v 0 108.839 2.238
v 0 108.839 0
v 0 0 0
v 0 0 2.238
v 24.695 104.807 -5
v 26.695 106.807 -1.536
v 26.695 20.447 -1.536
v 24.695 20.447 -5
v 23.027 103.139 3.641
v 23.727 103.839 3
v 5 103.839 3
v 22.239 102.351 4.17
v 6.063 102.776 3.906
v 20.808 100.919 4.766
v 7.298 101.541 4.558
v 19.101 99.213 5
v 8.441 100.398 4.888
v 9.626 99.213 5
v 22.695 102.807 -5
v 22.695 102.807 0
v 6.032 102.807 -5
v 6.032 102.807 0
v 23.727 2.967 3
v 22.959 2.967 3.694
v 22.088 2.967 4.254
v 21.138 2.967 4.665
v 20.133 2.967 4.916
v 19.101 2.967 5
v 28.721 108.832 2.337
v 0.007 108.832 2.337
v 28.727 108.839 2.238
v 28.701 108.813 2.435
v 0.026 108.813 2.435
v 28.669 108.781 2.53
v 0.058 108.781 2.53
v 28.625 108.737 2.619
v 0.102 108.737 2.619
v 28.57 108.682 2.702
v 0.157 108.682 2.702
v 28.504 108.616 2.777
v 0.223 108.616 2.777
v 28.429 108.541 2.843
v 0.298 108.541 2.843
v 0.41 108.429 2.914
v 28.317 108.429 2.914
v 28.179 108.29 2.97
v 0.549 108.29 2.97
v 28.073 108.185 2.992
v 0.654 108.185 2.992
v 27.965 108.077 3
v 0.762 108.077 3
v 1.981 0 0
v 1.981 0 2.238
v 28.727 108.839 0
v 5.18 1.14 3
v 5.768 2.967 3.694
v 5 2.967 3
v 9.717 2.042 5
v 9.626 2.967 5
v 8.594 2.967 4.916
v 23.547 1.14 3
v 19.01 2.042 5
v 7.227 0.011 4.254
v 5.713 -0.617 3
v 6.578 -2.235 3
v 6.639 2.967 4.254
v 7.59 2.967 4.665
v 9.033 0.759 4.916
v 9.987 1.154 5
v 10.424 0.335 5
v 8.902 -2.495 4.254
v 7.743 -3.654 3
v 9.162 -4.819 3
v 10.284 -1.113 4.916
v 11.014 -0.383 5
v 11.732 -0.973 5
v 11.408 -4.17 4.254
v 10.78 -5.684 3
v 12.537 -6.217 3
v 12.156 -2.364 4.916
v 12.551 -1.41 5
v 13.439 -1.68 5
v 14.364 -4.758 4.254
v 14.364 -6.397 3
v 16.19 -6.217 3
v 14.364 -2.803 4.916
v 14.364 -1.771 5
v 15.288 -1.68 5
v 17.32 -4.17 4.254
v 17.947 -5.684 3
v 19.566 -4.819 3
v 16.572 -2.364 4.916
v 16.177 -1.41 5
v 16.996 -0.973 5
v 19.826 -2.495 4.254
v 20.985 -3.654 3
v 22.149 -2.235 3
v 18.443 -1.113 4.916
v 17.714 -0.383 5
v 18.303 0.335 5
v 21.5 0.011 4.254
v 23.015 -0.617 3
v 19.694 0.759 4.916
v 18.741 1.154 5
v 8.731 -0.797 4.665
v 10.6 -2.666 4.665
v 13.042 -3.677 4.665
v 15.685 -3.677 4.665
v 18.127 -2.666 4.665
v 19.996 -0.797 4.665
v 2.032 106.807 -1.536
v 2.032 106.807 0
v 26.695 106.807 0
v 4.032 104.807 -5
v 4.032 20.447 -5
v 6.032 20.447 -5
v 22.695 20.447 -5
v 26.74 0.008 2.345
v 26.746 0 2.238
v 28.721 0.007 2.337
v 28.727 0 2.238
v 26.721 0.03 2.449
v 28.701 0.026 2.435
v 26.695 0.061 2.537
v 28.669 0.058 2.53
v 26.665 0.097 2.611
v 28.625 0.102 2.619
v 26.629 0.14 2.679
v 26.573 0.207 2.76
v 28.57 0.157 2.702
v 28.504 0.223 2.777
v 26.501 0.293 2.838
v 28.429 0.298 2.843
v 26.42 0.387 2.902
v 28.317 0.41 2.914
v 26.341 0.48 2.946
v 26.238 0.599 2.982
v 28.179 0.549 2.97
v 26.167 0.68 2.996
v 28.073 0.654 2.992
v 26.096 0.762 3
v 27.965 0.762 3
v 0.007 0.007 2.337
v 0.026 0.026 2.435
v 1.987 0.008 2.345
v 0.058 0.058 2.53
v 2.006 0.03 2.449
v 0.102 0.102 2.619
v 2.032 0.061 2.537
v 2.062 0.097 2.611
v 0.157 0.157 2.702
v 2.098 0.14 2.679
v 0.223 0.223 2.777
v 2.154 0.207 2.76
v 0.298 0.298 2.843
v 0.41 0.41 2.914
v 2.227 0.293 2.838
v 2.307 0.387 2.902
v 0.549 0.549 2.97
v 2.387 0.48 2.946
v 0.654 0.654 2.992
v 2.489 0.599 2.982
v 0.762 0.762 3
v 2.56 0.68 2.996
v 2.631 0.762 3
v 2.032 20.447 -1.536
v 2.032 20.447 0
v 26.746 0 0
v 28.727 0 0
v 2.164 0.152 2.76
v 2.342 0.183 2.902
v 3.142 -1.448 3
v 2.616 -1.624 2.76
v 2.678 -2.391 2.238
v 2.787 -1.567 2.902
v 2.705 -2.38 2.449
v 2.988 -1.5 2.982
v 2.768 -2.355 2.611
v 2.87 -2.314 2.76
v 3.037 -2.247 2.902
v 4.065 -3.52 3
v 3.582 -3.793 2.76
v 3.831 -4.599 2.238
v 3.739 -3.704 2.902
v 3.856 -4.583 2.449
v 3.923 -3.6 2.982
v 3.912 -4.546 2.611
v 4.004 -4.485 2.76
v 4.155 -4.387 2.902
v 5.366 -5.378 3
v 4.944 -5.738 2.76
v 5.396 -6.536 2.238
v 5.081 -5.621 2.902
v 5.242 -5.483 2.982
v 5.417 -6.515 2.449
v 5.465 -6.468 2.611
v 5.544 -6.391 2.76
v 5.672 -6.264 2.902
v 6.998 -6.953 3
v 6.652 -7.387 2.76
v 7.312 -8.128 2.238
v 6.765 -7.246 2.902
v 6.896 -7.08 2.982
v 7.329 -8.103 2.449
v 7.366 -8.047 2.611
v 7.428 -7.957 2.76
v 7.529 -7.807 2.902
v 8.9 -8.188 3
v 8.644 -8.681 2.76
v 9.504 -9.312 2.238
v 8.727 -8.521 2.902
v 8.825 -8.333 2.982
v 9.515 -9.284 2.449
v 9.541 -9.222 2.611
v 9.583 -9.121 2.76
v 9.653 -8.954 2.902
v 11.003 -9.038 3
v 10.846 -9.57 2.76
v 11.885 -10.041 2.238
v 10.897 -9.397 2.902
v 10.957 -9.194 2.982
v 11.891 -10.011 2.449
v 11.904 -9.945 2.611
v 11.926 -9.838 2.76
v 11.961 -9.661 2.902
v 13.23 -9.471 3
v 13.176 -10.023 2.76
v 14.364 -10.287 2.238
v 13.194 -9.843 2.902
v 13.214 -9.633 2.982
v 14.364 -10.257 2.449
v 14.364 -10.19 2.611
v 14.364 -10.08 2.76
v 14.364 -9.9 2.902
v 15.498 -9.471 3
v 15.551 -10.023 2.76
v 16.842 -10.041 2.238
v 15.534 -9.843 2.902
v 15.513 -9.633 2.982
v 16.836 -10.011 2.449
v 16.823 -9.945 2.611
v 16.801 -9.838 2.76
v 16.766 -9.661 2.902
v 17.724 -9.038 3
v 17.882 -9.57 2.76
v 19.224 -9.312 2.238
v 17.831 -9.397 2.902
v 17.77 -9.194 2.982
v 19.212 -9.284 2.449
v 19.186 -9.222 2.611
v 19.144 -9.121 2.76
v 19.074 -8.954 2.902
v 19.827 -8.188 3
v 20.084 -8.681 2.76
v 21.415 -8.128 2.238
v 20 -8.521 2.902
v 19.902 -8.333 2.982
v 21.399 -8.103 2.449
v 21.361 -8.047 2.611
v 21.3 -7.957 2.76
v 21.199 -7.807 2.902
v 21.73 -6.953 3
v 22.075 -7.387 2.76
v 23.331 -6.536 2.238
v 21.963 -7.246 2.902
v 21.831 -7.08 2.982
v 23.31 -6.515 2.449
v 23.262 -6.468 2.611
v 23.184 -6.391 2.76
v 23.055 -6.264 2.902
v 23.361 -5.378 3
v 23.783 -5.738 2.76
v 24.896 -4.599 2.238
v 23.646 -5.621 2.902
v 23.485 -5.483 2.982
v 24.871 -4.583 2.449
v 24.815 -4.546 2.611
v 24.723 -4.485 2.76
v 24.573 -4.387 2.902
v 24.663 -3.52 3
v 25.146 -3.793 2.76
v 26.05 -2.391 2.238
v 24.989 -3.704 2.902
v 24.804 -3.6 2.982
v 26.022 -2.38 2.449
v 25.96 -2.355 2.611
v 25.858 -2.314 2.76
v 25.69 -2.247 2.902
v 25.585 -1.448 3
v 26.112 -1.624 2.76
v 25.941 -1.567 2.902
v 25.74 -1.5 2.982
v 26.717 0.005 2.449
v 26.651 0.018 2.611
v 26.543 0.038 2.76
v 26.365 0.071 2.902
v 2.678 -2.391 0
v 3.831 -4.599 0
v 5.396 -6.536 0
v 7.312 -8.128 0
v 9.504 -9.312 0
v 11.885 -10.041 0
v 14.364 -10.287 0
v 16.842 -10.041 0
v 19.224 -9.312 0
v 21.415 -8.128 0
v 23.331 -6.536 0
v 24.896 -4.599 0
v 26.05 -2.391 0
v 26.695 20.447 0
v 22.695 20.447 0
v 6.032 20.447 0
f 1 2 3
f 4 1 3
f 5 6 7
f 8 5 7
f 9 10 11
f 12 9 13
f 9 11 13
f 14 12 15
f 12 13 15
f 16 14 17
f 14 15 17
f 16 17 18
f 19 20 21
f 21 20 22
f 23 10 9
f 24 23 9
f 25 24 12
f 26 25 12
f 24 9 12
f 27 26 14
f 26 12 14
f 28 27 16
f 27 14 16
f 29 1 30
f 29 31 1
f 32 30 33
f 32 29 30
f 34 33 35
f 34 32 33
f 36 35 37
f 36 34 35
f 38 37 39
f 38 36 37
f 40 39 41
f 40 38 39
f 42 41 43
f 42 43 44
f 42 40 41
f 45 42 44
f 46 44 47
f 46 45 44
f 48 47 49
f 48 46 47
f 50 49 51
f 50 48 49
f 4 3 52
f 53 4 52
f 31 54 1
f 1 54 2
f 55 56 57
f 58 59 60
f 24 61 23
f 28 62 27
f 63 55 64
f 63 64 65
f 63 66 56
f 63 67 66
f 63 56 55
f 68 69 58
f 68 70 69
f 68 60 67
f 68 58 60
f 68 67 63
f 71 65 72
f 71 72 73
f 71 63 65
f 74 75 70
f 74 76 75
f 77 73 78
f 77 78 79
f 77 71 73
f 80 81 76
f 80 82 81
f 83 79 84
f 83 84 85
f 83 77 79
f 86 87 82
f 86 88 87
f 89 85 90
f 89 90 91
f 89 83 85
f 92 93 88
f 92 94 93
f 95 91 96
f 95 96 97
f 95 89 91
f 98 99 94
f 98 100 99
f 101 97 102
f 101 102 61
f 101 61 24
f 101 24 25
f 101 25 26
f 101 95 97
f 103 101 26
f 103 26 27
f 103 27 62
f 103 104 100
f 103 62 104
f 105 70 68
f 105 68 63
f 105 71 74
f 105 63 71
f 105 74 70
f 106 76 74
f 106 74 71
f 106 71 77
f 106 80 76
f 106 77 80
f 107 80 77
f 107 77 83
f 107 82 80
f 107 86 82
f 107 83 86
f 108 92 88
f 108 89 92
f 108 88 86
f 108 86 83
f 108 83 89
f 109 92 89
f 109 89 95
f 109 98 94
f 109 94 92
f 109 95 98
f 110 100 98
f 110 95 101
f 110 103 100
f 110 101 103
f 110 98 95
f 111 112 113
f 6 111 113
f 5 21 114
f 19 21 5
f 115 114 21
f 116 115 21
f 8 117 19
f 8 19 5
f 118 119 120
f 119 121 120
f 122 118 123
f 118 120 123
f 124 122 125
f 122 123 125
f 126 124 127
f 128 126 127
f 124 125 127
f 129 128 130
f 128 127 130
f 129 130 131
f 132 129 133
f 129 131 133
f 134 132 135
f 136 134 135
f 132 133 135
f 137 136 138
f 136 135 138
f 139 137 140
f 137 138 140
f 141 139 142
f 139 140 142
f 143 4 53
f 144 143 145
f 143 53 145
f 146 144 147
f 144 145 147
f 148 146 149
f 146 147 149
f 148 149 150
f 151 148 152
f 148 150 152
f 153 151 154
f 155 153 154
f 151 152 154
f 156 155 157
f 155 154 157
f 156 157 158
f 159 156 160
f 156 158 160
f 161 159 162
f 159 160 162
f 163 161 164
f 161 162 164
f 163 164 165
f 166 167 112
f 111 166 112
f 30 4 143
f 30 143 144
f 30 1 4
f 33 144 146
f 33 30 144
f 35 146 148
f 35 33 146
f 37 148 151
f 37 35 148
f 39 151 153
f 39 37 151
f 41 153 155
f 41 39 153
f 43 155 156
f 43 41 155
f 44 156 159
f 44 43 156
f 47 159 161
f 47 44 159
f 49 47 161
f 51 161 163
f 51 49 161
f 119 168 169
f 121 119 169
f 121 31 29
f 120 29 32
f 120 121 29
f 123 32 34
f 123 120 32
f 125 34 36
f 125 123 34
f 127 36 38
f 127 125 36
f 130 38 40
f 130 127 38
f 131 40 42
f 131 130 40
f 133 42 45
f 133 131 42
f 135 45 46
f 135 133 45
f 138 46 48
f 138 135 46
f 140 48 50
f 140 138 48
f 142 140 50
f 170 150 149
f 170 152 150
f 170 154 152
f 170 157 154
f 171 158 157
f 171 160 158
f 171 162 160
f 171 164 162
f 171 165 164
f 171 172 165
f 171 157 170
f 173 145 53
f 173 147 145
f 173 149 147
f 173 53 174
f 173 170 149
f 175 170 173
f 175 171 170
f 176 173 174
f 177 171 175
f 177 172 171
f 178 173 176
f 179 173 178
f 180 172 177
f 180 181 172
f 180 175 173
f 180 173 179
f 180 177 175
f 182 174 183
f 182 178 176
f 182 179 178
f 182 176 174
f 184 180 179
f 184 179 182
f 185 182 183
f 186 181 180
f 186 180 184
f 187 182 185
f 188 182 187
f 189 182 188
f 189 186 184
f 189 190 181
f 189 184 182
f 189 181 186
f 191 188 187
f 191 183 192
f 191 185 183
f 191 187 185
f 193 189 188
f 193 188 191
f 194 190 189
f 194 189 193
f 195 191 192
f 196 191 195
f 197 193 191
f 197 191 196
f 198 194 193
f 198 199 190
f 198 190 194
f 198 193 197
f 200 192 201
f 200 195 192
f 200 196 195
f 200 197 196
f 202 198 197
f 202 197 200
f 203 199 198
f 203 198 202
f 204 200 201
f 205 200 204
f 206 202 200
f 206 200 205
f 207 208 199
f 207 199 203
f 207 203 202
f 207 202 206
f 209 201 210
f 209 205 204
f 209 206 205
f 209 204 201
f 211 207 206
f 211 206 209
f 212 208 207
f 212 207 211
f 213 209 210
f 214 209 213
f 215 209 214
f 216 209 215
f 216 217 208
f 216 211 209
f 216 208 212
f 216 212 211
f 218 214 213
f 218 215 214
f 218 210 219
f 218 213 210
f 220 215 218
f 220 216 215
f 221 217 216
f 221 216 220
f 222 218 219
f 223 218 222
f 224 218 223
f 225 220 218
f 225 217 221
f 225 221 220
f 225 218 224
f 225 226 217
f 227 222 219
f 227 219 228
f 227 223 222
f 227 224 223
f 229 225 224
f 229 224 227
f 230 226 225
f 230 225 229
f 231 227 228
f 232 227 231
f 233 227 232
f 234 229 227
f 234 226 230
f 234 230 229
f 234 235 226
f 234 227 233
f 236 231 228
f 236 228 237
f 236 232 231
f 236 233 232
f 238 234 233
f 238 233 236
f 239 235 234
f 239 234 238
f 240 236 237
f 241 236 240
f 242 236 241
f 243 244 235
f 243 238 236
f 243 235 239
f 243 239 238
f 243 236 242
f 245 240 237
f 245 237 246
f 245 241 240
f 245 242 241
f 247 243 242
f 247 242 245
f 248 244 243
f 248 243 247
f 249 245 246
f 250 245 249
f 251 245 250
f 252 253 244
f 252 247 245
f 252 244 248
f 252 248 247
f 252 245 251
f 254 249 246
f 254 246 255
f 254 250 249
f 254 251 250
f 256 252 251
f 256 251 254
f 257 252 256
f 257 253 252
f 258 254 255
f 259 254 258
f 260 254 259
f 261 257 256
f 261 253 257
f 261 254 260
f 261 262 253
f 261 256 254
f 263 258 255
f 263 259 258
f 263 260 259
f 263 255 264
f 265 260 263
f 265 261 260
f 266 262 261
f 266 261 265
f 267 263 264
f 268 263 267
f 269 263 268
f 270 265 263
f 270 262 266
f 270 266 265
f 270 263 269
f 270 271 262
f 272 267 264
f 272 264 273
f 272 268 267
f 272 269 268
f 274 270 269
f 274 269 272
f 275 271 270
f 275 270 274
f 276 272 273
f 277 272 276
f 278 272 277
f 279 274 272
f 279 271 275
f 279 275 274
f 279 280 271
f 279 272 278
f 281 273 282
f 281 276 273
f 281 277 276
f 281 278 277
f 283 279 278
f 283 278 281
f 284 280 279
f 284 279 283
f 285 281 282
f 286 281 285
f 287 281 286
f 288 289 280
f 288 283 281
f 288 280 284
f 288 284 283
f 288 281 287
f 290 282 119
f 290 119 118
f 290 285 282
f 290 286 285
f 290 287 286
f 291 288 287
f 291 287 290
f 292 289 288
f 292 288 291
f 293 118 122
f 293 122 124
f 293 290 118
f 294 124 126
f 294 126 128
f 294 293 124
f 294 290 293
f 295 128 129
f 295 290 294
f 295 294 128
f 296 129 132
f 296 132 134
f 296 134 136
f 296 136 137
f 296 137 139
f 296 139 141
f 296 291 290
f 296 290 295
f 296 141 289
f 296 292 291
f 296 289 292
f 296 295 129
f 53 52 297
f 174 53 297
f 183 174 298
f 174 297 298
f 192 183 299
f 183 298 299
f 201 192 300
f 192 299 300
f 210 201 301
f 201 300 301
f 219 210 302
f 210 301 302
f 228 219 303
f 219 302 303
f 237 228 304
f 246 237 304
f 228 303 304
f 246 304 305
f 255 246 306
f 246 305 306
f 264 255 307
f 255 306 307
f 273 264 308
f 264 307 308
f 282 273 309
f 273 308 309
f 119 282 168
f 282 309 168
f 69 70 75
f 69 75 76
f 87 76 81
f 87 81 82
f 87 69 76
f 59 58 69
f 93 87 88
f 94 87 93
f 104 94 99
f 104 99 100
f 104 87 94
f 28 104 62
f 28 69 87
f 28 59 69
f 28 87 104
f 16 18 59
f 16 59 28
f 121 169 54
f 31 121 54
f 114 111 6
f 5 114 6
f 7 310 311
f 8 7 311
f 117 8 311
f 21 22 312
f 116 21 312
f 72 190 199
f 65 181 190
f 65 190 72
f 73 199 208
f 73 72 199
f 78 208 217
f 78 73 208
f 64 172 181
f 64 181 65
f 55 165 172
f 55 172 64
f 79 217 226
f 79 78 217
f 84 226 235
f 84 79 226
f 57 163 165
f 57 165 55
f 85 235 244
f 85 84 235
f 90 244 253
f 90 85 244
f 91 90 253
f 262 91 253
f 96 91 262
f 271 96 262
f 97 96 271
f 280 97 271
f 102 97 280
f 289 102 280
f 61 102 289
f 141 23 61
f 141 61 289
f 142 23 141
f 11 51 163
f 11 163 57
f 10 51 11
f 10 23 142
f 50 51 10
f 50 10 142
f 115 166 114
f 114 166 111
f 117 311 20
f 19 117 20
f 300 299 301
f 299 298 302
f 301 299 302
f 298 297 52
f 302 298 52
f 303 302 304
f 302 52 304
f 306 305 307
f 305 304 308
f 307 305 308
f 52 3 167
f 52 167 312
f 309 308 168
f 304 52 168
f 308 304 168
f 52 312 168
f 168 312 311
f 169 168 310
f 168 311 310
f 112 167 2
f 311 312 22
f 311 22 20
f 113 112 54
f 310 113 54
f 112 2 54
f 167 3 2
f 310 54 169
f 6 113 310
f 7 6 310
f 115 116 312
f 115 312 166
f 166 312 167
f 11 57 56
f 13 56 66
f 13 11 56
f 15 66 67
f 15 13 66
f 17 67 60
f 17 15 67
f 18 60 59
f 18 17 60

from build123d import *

# Parameters (mm, degrees)
F1_DEPTH    = 3
F3_DEPTH    = 5
F4_SIZE2    = 3.4641016151
F4_SIZE     = 2
F6_DEPTH    = 2
F6_TAPER    = 25
F7_T1_DEPTH = 109.1731798991
F7_T3_DEPTH = 35.3291597983
F7_T6_ANGLE = 180
F8_R        = 0.762


# Not quite as in the source:
# - a fillet or chamfer that OpenCascade refuses, or shapes differently, is made with other operations: its cross-section is extruded or revolved along the edge and cut away or added


with BuildPart() as f1:
    # F0 (on Top) → F1 (new body)
    with BuildSketch(Plane.XY):
        with BuildLine():
            Line((28.7274, 108.839), (0, 108.839))
            Line((0, 108.839), (0, 0))
            Line((0, 0), (1.9812, 0))
            ThreePointArc((1.9812, 0), (14.3637, -10.287), (26.7462, 0))
            Line((26.7462, 0), (28.7274, 0))
            Line((28.7274, 0), (28.7274, 108.839))
        make_face()
    extrude(amount=F1_DEPTH)

    # F2 (on face) → F3 (join)
    with BuildSketch(Plane(origin=(0, 0, 0), x_dir=(1, 0, 0), z_dir=(0, 0, -1))):
        Polygon((6.032, -20.447), (2.032, -20.447), (2.032, -106.807), (26.6954, -106.807), (26.6954, -20.447), (22.6954, -20.447), (22.6954, -102.807), (6.032, -102.807), align=None)
    extrude(amount=F3_DEPTH)

    # F4
    f4_edges = [f1.edges().sort_by_distance(p)[0] for p in [
        (2.032, 63.627, -5),
        (14.3637, 106.807, -5),
        (26.6954, 63.627, -5),
    ]]
    f4_side = f1.faces().sort_by_distance((4.032, 21.345128, -5))[0]
    chamfer(f4_edges, length=F4_SIZE, length2=F4_SIZE2, reference=f4_side)

    # F5 (on face) → F6 (join)
    with BuildSketch(Plane.XY.offset(3)):
        with BuildLine():
            Line((23.7274, 103.839), (5, 103.839))
            Line((5, 103.839), (5, 2.9667))
            ThreePointArc((5, 2.9667), (14.3637, -6.397), (23.7274, 2.9667))
            Line((23.7274, 2.9667), (23.7274, 103.839))
        make_face()
    extrude(amount=F6_DEPTH, taper=F6_TAPER)

    # F7: fillet of radius 6.35 on 4 edges, made by hand

    # F7_s2 → F7_t1 (cut)
    with BuildSketch(Plane.XZ.offset(-112.1398798991)):
        with BuildLine():
            ThreePointArc((23.7274, 3), (21.6213072312, 4.4785933123), (19.1013865975, 5))
            Line((19.1013865975, 5), (22.7947846837, 5))
            Line((22.7947846837, 5), (23.7274, 3))
        make_face()
        with BuildLine():
            ThreePointArc((5, 3), (7.1060927688, 4.4785933123), (9.6260134025, 5))
            Line((9.6260134025, 5), (5.9326153163, 5))
            Line((5.9326153163, 5), (5, 3))
        make_face()
    extrude(amount=F7_T1_DEPTH, mode=Mode.SUBTRACT)

    # F7_s4 → F7_t3 (cut)
    with BuildSketch(Plane.YZ.offset(-3.3008798991)):
        with BuildLine():
            ThreePointArc((103.839, 3), (101.7329072312, 4.4785933123), (99.2129865975, 5))
            Line((99.2129865975, 5), (102.9063846837, 5))
            Line((102.9063846837, 5), (103.839, 3))
        make_face()
    extrude(amount=F7_T3_DEPTH, mode=Mode.SUBTRACT)

    # F7_s5 → F7_t6 (revolve, cut)
    with BuildSketch(Plane.XZ.offset(-2.9667)):
        with BuildLine():
            ThreePointArc((5, 3), (7.1060927688, 4.4785933123), (9.6260134025, 5))
            Line((9.6260134025, 5), (5.9326153163, 5))
            Line((5.9326153163, 5), (5, 3))
        make_face()
    revolve(axis=Axis((14.3637, 2.9667, 5), (0, 0, 1)), revolution_arc=F7_T6_ANGLE, mode=Mode.SUBTRACT)

    # F8
    f8_edges = [f1.edges().sort_by_distance(p)[0] for p in [
        (0, 54.4195, 3),
        (0.9906, 0, 3),
        (14.3637, -10.287, 3),
        (27.7368, 0, 3),
        (28.7274, 54.4195, 3),
        (14.3637, 108.839, 3),
    ]]
    fillet(f8_edges, radius=F8_R)


solid = f1.part
